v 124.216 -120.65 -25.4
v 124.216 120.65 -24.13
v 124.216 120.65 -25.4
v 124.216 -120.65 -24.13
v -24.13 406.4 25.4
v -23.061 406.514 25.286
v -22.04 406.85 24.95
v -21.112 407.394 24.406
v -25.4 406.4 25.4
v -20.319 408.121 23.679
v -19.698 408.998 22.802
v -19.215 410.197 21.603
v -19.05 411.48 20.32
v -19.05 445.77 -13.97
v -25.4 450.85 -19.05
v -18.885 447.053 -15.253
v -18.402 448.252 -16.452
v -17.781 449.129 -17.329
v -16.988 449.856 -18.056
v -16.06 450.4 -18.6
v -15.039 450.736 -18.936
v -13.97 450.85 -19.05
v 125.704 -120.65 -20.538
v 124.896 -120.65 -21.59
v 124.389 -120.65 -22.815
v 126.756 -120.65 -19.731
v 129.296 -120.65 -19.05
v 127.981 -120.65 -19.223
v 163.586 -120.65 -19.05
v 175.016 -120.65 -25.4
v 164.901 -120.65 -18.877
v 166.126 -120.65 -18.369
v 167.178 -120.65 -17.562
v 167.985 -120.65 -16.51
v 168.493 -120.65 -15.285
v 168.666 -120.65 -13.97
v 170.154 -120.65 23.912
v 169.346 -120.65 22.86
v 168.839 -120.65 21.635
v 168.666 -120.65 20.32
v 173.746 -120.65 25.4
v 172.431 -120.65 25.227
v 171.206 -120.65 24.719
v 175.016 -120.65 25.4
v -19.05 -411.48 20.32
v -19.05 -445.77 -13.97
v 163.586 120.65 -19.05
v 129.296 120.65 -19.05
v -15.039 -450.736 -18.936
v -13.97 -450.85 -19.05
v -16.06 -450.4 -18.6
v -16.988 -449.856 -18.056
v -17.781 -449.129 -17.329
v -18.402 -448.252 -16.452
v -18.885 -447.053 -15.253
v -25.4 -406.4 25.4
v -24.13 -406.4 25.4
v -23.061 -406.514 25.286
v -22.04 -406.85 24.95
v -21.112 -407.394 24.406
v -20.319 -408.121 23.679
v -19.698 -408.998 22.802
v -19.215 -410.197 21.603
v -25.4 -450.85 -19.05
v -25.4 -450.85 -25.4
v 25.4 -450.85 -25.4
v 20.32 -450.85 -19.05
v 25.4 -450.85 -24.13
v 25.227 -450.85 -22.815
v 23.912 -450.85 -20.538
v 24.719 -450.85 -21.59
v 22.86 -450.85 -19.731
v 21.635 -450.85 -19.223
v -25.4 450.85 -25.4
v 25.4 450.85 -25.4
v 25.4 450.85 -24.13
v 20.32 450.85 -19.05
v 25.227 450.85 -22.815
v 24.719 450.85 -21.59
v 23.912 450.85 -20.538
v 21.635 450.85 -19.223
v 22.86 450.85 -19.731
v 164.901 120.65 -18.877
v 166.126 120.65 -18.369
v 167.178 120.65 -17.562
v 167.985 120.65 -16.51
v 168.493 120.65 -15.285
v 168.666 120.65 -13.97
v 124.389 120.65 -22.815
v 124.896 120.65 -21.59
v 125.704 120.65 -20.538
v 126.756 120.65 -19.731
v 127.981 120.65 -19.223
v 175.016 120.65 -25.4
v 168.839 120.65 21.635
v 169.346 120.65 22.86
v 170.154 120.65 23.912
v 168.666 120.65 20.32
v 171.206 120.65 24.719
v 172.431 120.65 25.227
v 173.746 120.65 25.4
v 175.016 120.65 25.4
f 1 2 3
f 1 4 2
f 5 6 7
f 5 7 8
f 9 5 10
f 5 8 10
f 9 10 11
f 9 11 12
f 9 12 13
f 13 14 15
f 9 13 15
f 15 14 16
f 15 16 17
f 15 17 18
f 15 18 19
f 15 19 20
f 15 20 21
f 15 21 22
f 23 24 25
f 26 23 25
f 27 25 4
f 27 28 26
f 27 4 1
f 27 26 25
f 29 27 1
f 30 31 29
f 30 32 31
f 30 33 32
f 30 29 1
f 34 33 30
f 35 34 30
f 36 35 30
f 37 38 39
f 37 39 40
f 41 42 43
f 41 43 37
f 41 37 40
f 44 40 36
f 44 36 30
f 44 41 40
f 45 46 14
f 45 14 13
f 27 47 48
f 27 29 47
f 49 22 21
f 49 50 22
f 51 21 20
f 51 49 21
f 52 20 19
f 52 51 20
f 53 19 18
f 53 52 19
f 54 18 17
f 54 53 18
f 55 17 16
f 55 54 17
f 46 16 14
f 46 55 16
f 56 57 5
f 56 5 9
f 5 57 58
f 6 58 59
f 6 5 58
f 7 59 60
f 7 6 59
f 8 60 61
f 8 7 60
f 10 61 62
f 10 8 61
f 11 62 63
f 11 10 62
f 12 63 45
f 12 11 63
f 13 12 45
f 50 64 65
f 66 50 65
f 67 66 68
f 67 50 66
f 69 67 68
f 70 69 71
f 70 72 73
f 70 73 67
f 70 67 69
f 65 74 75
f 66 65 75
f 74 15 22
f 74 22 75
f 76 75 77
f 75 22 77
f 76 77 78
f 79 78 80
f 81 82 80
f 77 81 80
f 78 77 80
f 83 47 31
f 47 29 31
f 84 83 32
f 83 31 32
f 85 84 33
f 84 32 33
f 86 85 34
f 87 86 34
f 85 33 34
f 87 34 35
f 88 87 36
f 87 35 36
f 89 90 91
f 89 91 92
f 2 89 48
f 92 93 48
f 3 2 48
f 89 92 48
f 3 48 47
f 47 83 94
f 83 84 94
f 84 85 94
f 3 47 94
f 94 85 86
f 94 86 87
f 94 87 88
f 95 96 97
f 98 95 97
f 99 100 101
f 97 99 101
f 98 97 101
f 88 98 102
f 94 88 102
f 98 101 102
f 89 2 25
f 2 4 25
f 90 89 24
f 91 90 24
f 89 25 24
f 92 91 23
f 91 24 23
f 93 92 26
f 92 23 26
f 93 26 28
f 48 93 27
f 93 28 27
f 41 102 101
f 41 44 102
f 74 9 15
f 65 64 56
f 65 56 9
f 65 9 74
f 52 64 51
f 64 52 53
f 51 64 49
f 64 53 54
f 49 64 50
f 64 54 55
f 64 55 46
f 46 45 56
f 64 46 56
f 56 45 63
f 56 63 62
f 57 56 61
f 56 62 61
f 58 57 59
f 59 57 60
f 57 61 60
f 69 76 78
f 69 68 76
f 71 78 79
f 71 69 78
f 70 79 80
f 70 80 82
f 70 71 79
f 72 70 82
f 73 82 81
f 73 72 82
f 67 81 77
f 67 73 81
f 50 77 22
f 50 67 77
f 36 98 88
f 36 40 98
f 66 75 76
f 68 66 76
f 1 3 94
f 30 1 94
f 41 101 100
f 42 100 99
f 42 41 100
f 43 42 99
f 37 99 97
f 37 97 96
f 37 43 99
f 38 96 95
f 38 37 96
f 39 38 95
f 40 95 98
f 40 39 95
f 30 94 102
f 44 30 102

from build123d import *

# Parameters (mm, degrees)
F1_DEPTH = 450.85
F2_DEPTH = 120.65
F4_DEPTH = 25.4
F5_R     = 5.08
F5_2_R   = 5.08


with BuildPart() as f1:
    # F0 (on Front) → F1 (new body, symmetric)
    with BuildSketch(Plane.XZ):
        Polygon((-25.4, -25.4), (25.4, -25.4), (25.4, -19.05), (-19.05, -19.05), (-19.05, 25.4), (-25.4, 25.4), align=None)
    extrude(amount=F1_DEPTH, both=True)

    # F3 (on face) → F4 (cut)
    with BuildSketch(Plane.YZ.offset(-19.05)):
        Polygon((-450.85, 25.4), (-450.85, -19.05), (-406.4, 25.4), align=None)
        Polygon((450.85, 25.4), (406.4, 25.4), (450.85, -19.05), align=None)
    extrude(amount=-F4_DEPTH, mode=Mode.SUBTRACT)

    # F5
    f5_edges = [f1.edges().sort_by_distance(p)[0] for p in [
        (-19.05, 0, -19.05),
        (-19.05, 0, 25.4),
        (25.4, 0, -19.05),
    ]]
    fillet(f5_edges, radius=F5_R)


with BuildPart() as f2:
    # F0 (on Front) → F2 (new body, symmetric)
    with BuildSketch(Plane.XZ):
        Polygon((175.015824, 25.4), (168.665824, 25.4), (168.665824, -19.05), (124.215824, -19.05), (124.215824, -25.4), (175.015824, -25.4), align=None)
    extrude(amount=F2_DEPTH, both=True)

    # F5#2
    f5_2_edges = [f2.edges().sort_by_distance(p)[0] for p in [
        (168.665824, 0, -19.05),
        (124.215824, 0, -19.05),
        (168.665824, 0, 25.4),
    ]]
    fillet(f5_2_edges, radius=F5_2_R)


solid = Compound([f1.part, f2.part])
